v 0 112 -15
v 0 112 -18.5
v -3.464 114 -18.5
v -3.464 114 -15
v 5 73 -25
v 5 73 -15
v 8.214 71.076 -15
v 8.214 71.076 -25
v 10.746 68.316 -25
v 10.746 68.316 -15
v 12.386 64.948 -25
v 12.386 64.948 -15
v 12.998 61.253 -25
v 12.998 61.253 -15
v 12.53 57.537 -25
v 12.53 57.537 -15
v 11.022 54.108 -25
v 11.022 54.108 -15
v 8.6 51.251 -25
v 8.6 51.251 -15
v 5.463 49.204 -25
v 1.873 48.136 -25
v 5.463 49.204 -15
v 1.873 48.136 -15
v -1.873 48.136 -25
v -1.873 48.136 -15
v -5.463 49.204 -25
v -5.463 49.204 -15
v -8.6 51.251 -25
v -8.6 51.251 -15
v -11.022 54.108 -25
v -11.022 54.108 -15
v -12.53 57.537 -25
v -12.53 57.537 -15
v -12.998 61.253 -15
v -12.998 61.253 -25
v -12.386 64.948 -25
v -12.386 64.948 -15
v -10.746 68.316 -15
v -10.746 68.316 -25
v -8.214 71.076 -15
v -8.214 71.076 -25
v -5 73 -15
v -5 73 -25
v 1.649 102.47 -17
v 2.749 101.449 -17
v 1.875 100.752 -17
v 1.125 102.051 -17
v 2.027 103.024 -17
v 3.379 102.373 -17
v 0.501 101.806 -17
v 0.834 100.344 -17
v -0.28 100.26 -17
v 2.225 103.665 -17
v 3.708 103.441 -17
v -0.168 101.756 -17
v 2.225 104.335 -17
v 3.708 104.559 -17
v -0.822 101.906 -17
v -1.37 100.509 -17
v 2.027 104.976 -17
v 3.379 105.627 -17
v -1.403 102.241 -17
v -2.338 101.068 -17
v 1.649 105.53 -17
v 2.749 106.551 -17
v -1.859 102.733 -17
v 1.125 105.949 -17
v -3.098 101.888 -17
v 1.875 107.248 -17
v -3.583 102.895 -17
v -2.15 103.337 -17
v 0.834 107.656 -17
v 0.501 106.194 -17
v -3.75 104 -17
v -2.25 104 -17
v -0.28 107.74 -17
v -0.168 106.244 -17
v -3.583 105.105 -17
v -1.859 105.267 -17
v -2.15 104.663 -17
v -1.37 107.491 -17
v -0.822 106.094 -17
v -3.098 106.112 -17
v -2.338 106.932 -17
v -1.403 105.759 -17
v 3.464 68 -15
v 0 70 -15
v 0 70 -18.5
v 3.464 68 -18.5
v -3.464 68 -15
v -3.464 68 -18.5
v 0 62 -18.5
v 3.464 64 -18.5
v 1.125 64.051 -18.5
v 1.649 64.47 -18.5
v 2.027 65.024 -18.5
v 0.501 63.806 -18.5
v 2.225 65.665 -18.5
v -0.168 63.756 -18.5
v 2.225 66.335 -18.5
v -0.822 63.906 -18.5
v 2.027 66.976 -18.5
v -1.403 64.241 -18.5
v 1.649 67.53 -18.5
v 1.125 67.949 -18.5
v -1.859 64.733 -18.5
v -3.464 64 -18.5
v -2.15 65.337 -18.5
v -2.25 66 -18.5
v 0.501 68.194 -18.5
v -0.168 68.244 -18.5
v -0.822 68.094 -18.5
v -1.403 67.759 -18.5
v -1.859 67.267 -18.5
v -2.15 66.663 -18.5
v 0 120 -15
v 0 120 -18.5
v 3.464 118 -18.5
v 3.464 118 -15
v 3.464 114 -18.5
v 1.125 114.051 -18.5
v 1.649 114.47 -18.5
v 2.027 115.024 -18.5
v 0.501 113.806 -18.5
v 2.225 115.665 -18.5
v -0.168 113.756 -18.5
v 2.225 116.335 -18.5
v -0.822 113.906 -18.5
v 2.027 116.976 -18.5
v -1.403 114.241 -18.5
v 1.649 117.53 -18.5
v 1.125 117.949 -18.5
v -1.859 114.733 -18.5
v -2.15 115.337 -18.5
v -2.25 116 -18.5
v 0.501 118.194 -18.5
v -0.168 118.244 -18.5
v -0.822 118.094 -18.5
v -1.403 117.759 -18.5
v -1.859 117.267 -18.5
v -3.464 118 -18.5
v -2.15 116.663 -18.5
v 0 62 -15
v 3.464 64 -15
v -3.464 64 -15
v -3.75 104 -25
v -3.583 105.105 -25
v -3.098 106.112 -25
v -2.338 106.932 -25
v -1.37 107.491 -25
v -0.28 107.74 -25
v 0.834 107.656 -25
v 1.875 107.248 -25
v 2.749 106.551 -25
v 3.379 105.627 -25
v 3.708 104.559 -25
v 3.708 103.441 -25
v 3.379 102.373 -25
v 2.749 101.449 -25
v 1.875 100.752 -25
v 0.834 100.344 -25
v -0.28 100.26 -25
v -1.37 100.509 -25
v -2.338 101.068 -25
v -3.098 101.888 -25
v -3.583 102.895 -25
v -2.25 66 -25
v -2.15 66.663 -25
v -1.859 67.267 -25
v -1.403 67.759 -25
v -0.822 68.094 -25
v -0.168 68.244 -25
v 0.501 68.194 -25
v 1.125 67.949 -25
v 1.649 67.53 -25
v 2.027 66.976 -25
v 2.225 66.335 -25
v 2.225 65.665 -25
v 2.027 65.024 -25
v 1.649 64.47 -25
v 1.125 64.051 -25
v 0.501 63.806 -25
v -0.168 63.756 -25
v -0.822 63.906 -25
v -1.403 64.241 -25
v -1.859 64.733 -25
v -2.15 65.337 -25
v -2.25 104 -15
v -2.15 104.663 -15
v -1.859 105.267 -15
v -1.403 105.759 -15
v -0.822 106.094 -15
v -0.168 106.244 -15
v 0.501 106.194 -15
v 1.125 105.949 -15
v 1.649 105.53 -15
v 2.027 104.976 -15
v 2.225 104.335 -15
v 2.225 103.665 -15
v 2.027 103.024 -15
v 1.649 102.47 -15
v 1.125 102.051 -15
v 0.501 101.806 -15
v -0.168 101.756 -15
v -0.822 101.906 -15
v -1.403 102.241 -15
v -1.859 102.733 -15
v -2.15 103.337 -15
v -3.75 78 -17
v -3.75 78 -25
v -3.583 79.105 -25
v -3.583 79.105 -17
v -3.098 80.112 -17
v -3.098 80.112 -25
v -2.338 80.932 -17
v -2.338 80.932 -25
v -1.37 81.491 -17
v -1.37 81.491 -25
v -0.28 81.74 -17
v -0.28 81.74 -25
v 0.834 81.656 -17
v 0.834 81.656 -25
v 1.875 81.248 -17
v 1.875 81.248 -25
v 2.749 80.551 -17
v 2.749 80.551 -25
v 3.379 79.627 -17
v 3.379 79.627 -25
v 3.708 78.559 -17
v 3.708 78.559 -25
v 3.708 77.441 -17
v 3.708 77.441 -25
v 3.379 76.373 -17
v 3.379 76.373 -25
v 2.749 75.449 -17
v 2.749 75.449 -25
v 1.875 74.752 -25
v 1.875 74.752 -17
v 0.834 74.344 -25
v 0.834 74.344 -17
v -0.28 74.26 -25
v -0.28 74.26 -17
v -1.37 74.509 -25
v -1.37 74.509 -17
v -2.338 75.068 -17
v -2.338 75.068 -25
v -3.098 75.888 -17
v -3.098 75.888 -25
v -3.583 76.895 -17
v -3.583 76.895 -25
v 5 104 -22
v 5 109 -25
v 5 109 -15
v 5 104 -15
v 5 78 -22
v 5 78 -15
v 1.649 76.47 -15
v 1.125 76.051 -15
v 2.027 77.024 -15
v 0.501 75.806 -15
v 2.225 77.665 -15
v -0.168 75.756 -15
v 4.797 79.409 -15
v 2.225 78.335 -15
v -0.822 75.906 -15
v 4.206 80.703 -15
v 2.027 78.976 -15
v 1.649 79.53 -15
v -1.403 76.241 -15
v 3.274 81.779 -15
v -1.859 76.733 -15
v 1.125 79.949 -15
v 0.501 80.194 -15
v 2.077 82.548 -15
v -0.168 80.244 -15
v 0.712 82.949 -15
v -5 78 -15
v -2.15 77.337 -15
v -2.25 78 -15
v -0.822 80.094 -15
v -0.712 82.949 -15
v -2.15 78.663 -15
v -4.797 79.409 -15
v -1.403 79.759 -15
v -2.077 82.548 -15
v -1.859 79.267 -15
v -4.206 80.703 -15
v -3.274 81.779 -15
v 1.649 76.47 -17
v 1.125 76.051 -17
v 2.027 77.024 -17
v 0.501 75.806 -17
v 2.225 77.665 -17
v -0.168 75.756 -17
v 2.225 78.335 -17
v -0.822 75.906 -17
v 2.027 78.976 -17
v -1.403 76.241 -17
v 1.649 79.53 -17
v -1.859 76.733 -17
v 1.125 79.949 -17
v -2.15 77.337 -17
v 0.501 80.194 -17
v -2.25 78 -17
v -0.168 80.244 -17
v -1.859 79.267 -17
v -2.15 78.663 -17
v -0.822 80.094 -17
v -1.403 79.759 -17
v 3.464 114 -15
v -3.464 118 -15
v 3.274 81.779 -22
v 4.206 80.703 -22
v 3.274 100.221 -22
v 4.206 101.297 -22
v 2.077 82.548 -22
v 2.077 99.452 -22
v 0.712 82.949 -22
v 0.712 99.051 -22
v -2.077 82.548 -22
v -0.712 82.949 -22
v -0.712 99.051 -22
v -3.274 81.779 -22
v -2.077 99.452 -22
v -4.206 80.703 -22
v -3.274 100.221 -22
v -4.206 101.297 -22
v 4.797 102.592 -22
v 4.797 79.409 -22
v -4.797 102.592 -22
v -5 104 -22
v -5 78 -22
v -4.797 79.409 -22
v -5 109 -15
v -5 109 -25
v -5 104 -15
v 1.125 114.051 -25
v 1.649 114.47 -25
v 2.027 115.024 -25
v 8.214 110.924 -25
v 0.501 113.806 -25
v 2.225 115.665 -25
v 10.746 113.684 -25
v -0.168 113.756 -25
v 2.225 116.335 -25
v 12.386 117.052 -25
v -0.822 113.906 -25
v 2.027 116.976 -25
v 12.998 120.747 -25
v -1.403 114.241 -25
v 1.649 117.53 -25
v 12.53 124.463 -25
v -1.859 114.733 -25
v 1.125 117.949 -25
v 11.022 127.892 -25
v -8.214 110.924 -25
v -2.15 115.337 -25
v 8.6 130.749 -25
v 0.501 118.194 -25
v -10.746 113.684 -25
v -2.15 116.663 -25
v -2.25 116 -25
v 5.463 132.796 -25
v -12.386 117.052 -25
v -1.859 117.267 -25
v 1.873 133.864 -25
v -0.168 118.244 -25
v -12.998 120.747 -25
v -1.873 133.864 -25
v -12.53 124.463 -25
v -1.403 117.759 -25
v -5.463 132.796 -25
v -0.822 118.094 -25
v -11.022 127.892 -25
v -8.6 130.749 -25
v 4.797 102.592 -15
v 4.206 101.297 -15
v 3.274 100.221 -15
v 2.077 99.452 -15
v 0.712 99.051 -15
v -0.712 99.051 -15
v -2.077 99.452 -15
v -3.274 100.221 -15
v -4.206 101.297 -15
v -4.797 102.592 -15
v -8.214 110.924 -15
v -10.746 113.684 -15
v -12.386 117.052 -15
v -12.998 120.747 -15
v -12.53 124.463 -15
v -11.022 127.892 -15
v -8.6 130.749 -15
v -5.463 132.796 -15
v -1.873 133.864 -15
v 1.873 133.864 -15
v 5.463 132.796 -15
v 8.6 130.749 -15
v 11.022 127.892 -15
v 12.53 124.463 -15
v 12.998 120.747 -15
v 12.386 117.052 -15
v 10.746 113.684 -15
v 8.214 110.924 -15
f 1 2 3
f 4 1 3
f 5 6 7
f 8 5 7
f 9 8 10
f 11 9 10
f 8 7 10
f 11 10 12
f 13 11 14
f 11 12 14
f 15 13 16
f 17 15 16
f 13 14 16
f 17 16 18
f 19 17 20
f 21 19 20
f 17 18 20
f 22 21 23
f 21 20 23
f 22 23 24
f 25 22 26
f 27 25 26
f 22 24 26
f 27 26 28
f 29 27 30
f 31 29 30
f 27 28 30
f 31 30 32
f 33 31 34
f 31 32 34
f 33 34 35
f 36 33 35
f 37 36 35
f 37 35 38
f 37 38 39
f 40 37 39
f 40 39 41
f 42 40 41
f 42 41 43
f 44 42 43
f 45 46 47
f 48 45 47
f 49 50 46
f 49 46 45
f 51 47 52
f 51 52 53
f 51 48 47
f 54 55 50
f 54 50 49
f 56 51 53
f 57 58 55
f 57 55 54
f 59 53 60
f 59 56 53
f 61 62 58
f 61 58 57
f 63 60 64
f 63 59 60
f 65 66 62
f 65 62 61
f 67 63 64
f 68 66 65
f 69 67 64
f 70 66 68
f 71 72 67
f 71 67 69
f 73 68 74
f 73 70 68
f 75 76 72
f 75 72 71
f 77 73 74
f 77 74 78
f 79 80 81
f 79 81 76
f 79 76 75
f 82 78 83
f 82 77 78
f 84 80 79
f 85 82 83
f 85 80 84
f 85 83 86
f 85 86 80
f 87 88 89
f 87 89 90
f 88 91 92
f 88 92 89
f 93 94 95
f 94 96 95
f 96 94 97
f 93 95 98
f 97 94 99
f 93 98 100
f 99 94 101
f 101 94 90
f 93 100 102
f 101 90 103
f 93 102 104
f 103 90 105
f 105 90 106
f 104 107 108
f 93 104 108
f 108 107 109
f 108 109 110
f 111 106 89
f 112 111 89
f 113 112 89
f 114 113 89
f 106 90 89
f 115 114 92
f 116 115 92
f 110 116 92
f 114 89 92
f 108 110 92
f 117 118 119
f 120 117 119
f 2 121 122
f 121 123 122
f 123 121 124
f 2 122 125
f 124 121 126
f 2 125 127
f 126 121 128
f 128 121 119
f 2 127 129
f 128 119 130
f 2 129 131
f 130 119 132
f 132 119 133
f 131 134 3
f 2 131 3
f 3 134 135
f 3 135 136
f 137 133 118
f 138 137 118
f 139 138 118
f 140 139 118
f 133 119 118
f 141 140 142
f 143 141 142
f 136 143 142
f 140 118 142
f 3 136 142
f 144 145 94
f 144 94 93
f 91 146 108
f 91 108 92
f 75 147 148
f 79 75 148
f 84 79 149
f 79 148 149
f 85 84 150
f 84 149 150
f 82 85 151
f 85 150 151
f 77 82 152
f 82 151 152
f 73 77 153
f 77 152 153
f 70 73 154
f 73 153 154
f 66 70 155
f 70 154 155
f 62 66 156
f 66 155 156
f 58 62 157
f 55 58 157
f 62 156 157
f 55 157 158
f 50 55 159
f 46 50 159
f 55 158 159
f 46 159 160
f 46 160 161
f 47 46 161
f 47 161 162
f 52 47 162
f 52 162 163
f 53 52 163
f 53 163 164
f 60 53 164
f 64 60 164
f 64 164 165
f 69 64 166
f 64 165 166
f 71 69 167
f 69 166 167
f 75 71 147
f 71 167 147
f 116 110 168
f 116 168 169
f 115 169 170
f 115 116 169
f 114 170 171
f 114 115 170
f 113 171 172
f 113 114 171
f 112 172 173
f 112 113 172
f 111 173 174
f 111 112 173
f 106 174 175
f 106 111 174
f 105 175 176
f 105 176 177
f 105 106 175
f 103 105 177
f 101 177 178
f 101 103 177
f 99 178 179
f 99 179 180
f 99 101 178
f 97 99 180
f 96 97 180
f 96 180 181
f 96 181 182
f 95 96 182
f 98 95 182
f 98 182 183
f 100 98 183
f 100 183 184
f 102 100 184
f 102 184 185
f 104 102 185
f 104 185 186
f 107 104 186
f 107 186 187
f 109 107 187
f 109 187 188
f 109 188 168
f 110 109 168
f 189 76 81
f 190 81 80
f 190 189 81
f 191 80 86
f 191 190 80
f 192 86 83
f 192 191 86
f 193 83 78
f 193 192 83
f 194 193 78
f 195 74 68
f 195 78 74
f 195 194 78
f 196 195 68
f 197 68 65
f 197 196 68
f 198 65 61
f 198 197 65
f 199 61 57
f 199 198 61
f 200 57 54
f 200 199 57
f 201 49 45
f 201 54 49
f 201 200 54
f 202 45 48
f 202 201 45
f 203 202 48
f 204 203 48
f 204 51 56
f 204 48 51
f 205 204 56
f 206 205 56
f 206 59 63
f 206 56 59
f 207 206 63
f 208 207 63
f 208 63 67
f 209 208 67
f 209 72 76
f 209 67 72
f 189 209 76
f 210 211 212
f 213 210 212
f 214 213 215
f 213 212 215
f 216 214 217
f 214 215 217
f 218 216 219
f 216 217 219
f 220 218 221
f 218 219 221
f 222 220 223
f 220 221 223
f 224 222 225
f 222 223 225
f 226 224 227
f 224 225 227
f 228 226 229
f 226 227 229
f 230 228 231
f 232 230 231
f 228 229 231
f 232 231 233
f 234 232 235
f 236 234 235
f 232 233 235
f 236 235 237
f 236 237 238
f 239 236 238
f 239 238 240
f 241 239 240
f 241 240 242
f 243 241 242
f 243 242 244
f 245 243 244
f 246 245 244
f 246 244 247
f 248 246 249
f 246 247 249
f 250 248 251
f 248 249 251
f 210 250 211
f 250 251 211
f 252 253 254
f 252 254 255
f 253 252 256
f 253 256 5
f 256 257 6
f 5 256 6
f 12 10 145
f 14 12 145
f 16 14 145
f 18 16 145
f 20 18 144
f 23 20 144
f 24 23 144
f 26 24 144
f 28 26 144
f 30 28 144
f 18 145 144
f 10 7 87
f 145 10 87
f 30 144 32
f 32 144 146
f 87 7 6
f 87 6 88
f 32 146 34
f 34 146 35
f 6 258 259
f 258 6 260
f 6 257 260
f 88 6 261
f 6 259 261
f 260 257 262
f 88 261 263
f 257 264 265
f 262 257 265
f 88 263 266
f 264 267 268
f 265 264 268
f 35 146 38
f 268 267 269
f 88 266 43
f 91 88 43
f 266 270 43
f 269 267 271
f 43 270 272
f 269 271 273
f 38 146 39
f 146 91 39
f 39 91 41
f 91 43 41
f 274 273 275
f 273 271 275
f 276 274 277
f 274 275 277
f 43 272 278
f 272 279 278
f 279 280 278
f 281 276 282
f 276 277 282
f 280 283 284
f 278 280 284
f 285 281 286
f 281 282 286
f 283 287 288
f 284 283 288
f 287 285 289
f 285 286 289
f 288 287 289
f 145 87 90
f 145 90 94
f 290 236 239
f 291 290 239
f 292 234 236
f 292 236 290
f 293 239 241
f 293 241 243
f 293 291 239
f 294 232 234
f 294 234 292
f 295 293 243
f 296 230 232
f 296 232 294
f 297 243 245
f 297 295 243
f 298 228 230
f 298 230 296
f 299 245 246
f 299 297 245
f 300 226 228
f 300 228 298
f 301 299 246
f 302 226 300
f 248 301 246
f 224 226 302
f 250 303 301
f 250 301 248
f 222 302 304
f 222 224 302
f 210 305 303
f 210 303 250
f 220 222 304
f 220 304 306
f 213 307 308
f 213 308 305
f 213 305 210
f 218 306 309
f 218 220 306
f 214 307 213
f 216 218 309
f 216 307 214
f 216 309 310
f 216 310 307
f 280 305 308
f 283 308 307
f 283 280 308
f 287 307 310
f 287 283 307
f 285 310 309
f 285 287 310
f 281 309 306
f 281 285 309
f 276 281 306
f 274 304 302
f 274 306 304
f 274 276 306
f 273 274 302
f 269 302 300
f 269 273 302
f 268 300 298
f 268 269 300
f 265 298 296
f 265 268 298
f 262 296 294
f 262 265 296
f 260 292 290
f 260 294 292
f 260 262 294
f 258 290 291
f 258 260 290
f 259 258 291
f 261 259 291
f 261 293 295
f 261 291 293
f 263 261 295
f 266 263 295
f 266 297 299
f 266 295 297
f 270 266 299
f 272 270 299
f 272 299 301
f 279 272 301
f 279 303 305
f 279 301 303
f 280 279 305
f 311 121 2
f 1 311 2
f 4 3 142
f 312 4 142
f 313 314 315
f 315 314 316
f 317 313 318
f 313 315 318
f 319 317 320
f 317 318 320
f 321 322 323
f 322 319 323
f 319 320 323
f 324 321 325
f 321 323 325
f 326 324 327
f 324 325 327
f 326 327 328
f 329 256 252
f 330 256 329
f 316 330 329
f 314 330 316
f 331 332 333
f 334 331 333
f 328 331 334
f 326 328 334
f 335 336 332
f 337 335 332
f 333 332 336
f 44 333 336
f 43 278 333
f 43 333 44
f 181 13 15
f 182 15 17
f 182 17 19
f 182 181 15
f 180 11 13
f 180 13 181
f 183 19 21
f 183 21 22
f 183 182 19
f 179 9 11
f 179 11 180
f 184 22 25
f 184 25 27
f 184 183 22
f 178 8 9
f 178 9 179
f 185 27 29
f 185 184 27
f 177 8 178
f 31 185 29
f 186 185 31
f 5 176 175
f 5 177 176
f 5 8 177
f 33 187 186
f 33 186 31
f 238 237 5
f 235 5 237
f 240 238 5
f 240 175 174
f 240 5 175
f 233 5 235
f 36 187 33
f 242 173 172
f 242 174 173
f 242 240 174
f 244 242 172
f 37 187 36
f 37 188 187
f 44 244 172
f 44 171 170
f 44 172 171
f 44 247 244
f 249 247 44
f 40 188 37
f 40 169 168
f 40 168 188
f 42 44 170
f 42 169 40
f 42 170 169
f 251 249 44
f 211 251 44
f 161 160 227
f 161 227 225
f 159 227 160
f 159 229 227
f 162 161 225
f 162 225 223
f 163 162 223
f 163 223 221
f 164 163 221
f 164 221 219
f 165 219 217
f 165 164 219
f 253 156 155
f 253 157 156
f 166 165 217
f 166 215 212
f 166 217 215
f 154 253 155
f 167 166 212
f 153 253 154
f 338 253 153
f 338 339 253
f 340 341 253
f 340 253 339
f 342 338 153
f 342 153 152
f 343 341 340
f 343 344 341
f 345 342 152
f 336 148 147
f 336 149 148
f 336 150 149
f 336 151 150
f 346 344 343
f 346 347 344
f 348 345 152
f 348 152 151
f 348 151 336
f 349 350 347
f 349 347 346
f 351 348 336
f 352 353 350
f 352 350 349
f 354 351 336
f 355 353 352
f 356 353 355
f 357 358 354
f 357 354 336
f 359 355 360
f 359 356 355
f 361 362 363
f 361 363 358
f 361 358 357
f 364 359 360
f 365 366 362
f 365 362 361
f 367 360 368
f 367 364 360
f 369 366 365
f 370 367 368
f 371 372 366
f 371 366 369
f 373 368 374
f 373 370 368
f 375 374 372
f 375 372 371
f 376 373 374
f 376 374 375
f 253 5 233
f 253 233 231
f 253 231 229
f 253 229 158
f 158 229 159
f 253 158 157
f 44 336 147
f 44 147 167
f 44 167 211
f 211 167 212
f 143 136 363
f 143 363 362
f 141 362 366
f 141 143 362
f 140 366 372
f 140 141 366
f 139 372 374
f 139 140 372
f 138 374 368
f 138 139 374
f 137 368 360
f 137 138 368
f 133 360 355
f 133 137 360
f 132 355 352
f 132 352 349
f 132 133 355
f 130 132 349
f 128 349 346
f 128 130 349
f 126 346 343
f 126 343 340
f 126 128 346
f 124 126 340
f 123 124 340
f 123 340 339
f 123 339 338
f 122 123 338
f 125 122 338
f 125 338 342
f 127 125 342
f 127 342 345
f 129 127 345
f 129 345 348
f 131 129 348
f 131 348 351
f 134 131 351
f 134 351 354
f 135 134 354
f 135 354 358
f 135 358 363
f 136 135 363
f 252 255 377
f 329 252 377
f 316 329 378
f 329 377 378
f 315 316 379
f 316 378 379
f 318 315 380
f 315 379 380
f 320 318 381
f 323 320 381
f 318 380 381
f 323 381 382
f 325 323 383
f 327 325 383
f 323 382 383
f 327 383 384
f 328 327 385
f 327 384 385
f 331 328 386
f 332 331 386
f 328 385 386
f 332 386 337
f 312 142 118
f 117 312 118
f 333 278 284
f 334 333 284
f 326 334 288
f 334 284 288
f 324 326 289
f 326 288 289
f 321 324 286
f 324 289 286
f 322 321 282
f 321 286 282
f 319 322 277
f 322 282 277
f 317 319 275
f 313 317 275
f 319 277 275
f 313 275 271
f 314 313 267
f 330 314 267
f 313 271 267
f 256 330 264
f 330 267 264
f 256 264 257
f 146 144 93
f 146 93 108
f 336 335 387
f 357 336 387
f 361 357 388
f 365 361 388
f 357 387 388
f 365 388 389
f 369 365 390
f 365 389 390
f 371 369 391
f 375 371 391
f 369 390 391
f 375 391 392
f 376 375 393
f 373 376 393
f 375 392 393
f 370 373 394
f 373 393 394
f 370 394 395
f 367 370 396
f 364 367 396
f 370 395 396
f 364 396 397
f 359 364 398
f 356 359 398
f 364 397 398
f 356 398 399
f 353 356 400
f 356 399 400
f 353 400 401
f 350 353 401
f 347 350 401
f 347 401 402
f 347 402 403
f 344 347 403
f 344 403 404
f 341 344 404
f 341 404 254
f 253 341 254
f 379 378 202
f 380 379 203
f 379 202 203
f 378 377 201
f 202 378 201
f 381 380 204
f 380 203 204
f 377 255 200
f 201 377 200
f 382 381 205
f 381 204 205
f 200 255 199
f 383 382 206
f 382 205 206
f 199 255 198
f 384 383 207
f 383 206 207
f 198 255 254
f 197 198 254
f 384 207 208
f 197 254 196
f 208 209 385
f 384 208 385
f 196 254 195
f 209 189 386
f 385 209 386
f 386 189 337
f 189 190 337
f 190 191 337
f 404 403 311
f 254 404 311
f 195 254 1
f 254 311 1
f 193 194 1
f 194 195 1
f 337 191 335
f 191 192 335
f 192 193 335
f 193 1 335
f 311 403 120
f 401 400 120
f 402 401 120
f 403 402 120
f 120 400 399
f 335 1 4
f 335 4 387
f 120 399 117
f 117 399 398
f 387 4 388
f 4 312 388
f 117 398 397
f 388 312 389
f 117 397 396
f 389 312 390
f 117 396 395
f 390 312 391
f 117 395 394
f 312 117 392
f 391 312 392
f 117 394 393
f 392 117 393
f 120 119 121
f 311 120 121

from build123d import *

# Parameters (mm, degrees)
SKETCH204_R             = 2.25
PAD094_DEPTH            = 10
POCKET084_DEPTH         = 7
POCKET085_DEPTH         = 3.5
SKETCH213_R             = 2.25
POCKET086_DEPTH         = 10
SKETCH214_R             = 3.75
POCKET087_DEPTH         = 8
BODY025_PLACEMENT_ANGLE = 180


with BuildPart() as part:
    # Sketch204 → Pad094 (new body)
    with BuildSketch(Plane.XY):
        with BuildLine():
            ThreePointArc((5, 18), (0, 43), (-5, 18))
            Line((-5, 18), (-5, -18))
            ThreePointArc((-5, -18), (0, -43), (5, -18))
            Line((5, 18), (5, -18))
        make_face()
        with Locations((0, 13)):
            Circle(SKETCH204_R, mode=Mode.SUBTRACT)
        with Locations((0, -13)):
            Circle(SKETCH204_R, mode=Mode.SUBTRACT)
    extrude(amount=PAD094_DEPTH)

    # Sketch211 → Pocket084 (cut)
    with BuildSketch(Plane.XY):
        with BuildLine():
            Line((-5, 13.000202), (-5, -12.999798))
            ThreePointArc((5, -12.999798), (0, -7.999799), (-5, -12.999798))
            Line((5, -12.999798), (5, 13.000202))
            ThreePointArc((-5, 13.000202), (0, 8.000186), (5, 13.000202))
        make_face()
    extrude(amount=POCKET084_DEPTH, mode=Mode.SUBTRACT)

    # Sketch212 → Pocket085 (cut, symmetric)
    with BuildSketch(Plane.XY):
        Polygon((0, -21), (-3.464102, -23), (-3.464102, -27), (0, -29), (3.464102, -27), (3.464102, -23), align=None)
        Polygon((0, 21), (3.464102, 23), (3.464102, 27), (0, 29), (-3.464102, 27), (-3.464102, 23), align=None)
    extrude(amount=POCKET085_DEPTH, both=True, mode=Mode.SUBTRACT)

    # Sketch213 → Pocket086 (cut)
    with BuildSketch(Plane.XY):
        with Locations((0, 25)):
            Circle(SKETCH213_R)
        with Locations((0, -25)):
            Circle(SKETCH213_R)
    extrude(amount=POCKET086_DEPTH, mode=Mode.SUBTRACT)

    # Sketch214 (on Face5 of Pocket086) → Pocket087 (cut)
    with BuildSketch(Plane.XY.offset(10)):
        with Locations((0, 13)):
            Circle(SKETCH214_R)
        with Locations((0, -13)):
            Circle(SKETCH214_R)
    extrude(amount=-POCKET087_DEPTH, mode=Mode.SUBTRACT)


with BuildPart() as part_1:
    # Body025 placement: moved
    add(part.part.moved(Location((0, 91, -15))).rotate(Axis((0, 91, -15), (0, 1, 0)), BODY025_PLACEMENT_ANGLE))


solid = part_1.part
